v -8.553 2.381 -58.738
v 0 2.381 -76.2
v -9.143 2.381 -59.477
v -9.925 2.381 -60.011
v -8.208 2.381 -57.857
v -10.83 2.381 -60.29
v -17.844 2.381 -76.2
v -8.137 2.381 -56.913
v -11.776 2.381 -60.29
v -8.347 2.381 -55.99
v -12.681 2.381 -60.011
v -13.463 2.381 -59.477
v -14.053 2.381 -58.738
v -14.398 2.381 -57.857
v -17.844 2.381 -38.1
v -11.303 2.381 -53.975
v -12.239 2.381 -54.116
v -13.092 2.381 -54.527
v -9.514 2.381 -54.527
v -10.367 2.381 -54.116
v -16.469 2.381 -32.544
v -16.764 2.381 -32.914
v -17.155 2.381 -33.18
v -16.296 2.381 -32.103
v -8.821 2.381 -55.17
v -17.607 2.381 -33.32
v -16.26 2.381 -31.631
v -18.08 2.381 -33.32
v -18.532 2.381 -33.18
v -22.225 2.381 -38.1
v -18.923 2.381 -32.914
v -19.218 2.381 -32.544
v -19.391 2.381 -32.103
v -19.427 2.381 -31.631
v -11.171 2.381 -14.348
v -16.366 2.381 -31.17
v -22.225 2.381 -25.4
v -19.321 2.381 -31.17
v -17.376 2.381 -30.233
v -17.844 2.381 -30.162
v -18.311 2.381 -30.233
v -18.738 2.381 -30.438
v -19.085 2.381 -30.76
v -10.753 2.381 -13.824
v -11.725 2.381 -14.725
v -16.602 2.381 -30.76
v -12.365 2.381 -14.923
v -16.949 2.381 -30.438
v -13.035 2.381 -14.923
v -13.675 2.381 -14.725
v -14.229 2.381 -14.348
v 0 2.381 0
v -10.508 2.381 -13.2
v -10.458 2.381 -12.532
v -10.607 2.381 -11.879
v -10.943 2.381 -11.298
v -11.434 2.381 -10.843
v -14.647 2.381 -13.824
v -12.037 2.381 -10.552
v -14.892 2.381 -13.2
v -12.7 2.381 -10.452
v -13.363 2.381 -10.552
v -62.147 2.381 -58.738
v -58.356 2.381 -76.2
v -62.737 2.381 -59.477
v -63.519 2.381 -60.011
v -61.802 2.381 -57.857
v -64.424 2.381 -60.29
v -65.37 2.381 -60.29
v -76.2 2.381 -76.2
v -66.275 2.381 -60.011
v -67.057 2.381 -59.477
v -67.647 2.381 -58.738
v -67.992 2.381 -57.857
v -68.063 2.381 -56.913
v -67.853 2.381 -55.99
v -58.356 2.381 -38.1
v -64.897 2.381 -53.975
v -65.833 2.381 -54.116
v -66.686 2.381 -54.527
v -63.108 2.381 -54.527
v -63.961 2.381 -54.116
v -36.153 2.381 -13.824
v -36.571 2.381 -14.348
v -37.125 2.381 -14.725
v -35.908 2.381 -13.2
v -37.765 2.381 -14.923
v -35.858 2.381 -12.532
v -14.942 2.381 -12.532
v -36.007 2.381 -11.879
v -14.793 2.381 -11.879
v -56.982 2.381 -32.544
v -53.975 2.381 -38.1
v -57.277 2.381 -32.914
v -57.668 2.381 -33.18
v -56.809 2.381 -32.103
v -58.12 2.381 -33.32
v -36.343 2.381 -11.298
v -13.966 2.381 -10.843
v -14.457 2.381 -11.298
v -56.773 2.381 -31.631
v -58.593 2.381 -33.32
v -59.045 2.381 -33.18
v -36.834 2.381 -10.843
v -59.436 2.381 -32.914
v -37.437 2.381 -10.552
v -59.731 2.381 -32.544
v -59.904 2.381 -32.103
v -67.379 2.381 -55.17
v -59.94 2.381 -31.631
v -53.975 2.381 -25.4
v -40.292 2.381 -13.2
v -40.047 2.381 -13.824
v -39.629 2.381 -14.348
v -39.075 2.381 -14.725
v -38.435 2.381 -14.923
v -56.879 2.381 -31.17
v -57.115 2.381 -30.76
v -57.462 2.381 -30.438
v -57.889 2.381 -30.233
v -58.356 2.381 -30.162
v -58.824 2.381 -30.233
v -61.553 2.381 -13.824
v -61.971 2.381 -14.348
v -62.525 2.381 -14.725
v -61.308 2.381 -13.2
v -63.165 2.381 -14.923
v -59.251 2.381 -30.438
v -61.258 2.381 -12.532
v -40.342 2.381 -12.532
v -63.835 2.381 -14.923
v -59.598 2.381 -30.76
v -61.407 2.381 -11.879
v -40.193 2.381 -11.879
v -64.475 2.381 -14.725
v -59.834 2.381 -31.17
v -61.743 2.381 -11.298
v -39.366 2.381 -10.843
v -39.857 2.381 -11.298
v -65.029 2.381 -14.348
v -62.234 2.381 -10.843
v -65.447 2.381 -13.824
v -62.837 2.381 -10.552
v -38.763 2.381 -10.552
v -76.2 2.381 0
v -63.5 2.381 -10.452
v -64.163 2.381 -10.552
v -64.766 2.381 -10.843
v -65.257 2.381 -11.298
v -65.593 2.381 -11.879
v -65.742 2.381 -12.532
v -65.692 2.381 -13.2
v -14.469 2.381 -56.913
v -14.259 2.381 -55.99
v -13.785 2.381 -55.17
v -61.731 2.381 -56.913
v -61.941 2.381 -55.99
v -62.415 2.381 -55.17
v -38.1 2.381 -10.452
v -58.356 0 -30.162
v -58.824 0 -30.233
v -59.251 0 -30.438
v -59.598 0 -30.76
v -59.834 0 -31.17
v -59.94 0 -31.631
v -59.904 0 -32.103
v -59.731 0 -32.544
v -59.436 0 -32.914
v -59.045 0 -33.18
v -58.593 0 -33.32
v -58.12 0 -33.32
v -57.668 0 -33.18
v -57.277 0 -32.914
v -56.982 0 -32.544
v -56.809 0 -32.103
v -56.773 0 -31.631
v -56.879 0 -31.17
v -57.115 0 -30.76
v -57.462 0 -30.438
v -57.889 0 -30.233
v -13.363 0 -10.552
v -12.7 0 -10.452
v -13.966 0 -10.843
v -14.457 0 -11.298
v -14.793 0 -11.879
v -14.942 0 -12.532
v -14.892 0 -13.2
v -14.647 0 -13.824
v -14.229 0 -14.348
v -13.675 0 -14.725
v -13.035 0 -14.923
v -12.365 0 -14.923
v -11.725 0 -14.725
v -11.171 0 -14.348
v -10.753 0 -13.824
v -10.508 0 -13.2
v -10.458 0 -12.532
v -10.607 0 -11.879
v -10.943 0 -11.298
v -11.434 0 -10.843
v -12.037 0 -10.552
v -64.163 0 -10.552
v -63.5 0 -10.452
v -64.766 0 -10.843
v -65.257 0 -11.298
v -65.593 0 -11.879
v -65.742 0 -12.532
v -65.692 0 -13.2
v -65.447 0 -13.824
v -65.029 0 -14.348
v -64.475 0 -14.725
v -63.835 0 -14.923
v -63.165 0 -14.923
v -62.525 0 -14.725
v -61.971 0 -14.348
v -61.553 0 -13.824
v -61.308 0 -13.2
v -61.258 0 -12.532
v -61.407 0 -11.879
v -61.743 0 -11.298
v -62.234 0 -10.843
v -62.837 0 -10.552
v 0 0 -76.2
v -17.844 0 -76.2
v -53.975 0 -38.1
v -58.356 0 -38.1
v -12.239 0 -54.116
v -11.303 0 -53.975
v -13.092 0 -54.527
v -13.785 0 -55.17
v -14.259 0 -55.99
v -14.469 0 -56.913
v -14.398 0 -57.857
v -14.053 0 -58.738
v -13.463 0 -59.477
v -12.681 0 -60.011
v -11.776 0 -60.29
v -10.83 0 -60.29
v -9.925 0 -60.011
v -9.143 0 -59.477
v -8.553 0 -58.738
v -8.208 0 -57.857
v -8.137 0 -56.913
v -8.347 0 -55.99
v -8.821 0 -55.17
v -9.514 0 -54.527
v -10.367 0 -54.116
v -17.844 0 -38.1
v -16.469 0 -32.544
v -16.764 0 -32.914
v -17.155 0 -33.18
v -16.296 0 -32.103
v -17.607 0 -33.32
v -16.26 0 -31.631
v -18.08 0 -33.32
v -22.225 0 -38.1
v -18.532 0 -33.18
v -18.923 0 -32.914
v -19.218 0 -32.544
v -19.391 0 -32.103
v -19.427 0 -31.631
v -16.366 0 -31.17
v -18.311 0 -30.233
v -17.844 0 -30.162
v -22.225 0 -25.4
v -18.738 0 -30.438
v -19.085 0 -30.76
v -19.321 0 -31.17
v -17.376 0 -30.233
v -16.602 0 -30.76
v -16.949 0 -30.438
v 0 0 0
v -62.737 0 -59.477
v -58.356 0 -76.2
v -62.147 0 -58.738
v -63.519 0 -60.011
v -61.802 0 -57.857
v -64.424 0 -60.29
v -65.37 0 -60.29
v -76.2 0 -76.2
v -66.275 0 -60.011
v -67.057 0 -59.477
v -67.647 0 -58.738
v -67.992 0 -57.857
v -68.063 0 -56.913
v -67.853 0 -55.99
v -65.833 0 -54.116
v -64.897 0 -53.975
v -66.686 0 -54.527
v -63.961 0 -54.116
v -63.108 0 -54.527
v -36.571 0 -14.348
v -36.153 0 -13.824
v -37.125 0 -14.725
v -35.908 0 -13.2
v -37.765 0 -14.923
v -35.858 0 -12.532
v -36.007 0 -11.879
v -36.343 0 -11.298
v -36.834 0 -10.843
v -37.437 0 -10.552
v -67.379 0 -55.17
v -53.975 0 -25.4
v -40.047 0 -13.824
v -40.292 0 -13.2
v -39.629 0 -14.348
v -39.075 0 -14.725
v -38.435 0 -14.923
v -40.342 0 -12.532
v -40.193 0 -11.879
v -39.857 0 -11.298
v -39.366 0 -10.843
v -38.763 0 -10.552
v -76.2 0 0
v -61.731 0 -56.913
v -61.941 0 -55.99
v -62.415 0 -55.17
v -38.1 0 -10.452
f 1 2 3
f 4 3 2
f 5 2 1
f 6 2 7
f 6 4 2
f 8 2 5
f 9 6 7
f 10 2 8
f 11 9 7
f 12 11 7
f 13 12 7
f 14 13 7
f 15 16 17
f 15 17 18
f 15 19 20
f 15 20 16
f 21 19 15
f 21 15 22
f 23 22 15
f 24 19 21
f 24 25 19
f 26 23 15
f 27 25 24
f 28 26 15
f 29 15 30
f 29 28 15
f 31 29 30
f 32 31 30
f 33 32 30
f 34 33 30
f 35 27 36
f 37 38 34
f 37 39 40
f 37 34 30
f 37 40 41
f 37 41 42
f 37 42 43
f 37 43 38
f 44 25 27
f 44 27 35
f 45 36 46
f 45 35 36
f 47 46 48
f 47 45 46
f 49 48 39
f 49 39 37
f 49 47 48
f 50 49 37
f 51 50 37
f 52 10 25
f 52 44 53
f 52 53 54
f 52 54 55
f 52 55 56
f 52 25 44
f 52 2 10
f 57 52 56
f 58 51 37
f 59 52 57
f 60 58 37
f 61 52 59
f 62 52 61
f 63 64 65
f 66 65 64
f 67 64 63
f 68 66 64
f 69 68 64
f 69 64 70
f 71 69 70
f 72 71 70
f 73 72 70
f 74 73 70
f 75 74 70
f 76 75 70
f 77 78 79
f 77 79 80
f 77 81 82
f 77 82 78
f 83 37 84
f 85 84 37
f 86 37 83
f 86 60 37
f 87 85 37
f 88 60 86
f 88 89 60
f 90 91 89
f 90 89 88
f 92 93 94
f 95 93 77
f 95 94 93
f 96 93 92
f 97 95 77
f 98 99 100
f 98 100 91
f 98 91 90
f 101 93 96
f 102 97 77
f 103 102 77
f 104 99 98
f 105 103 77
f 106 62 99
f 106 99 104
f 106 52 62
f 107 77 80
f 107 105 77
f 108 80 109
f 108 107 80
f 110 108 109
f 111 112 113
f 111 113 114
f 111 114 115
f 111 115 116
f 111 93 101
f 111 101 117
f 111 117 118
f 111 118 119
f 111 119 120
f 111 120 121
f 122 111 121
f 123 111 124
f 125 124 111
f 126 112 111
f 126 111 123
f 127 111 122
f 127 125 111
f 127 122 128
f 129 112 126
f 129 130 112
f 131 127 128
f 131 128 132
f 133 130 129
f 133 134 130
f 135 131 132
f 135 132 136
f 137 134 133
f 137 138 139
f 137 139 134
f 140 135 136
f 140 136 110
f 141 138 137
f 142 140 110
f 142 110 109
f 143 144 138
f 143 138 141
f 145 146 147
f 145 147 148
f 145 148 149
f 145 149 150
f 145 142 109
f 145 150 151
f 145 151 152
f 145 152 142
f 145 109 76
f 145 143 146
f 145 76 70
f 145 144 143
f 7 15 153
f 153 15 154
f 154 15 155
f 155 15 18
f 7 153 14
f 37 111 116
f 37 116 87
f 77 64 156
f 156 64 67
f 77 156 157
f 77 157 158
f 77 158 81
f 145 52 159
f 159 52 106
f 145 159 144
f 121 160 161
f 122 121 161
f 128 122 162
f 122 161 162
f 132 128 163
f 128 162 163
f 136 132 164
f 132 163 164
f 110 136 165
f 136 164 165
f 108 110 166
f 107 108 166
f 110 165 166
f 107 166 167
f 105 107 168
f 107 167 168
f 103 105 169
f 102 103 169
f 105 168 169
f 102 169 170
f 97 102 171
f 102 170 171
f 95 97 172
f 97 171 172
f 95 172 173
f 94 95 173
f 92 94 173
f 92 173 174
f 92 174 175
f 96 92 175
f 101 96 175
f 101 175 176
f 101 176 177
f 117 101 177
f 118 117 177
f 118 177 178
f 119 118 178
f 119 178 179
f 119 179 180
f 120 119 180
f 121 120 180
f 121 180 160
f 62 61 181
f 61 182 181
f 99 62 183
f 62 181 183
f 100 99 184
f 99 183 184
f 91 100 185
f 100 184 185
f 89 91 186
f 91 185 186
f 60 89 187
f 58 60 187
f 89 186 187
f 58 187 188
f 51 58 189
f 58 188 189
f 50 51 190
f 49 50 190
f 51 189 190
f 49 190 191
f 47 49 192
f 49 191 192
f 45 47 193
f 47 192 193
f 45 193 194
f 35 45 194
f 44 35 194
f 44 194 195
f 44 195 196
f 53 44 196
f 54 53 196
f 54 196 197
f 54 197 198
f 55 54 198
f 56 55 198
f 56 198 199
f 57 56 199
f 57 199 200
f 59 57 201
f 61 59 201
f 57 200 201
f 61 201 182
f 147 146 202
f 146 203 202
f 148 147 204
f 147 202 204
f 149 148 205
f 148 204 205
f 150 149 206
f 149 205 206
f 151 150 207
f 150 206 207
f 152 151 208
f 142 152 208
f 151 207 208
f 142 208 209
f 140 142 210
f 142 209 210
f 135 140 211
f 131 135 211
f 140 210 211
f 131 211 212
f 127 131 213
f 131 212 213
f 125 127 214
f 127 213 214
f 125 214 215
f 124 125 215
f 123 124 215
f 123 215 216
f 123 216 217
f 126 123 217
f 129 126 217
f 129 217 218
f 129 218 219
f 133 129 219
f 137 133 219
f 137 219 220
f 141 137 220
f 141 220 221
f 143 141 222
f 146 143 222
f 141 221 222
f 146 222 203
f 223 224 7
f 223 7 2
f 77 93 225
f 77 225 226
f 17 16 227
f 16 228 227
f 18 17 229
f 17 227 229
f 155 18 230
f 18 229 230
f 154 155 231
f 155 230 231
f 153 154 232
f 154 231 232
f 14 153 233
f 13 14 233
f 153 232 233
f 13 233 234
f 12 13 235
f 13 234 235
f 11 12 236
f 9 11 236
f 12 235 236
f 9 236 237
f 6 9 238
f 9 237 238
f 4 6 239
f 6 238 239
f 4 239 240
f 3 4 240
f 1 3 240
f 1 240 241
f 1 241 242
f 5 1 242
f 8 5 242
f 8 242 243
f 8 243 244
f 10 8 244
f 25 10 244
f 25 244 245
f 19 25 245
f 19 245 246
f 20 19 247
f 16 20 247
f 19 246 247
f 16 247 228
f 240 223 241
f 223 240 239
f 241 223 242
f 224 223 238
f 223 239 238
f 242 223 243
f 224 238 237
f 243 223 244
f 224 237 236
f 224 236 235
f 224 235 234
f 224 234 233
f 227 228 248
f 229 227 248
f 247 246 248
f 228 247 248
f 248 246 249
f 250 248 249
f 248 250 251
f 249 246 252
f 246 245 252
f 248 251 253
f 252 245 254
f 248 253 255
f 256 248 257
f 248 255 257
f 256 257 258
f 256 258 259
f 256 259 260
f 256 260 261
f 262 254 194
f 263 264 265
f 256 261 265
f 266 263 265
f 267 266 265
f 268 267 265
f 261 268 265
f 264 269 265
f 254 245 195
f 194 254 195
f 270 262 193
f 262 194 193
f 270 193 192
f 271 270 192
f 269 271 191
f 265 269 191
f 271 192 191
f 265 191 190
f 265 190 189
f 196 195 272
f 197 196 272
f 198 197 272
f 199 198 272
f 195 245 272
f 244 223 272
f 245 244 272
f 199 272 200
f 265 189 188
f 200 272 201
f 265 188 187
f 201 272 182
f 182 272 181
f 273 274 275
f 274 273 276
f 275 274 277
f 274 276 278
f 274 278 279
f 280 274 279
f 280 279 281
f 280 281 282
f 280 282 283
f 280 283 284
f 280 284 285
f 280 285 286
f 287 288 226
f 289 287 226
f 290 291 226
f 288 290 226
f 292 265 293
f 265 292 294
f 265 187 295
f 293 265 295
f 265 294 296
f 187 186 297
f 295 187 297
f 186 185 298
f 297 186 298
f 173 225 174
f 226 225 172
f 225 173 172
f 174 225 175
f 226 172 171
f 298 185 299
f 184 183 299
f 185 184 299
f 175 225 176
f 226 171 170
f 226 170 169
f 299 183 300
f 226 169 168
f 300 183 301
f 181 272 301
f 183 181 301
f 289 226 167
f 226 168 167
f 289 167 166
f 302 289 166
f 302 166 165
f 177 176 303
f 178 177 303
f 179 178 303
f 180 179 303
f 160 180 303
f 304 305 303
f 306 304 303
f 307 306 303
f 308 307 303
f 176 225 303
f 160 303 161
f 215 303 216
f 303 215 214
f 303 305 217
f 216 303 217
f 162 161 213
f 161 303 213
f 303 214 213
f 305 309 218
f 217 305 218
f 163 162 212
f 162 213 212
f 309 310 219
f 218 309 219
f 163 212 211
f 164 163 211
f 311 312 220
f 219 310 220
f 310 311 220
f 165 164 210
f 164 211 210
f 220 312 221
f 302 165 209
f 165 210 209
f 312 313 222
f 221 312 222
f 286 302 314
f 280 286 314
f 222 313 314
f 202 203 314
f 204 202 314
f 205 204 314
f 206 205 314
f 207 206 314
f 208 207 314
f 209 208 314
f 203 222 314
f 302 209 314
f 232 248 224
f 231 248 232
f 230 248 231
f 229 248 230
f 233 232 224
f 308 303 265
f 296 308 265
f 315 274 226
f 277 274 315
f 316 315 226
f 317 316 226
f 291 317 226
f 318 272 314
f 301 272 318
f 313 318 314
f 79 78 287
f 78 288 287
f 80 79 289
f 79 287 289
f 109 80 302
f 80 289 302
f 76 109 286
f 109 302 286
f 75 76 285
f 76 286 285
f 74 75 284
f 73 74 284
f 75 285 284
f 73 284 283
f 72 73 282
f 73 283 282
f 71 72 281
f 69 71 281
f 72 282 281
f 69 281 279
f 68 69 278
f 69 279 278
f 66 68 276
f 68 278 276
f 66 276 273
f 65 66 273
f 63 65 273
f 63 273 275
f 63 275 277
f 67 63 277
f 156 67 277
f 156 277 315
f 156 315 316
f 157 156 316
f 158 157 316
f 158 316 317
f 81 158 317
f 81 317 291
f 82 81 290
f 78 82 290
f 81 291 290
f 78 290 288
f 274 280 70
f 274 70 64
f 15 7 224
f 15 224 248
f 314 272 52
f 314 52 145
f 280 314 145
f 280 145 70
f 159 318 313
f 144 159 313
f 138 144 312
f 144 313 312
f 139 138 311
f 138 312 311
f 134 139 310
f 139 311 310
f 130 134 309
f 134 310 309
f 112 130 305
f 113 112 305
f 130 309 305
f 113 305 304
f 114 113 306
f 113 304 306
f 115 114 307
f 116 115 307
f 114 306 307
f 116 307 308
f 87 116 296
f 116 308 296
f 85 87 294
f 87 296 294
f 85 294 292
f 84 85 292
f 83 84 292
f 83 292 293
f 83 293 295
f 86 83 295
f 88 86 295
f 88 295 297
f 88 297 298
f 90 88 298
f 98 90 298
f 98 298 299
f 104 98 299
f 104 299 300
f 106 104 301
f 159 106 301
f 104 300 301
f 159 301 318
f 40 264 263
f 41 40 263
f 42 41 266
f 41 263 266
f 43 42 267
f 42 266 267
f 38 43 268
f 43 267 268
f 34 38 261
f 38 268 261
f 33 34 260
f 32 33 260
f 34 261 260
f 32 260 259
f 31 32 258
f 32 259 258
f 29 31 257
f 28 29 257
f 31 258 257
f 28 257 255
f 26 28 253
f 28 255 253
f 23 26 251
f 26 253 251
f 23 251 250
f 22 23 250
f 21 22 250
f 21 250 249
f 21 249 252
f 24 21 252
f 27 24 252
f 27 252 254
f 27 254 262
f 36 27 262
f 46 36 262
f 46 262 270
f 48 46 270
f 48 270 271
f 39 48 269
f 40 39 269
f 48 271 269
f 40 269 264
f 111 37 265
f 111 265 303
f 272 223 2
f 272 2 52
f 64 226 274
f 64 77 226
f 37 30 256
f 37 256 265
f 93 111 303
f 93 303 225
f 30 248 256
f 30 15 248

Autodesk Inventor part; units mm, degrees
ref_plane "YZ Plane" through (0, 0, 0) normal (1, 0, 0) x (0, 1, 0)
ref_plane "XZ Plane" through (0, 0, 0) normal (0, 1, 0) x (-1, 0, 0)
ref_plane "XY Plane" through (0, 0, 0) normal (0, 0, 1) x (1, 0, 0)
sketch "Sketch1" plane through (0, 0, 0) normal (0, 1, 0) x (-1, 0, 0)
  line L0 (0, 0) -> (76.2, 0)
  line L1 (76.2, 0) -> (76.2, -76.2)
  line L2 (76.2, -76.2) -> (0, -76.2)
  line L3 (0, -76.2) -> (0, 0)
  dimension "d0" = 76.2
  dimension "d1" = 76.2
extrude "Extrusion1" add sketch "Sketch1" along normal blind 2.3813
sketch "Sketch2" plane through (0, 2.3813, 0) normal (0, 1, 0) x (1, 0, 0)
  line L0 (-83.8553, 12.7) -> (21.3104, 12.7) construction
  line L1 (-76.2, 0) -> (0, 0) construction
  line L2 (-76.2, 76.2) -> (-76.2, 0) construction
  point P0 (-63.5, 12.7)
  point P1 (-38.1, 12.7)
  point P2 (-12.7, 12.7)
  dimension "d4" = 12.7
  dimension "d5" = 12.7
  dimension "d6" = 25.4
  dimension "d39" = 25.4
hole "Hole1" at (-63.5, 2.3813, -12.7) at (-38.1, 2.3813, -12.7) at (-12.7, 2.3813, -12.7) direction (0, -1, 0) diameter 4.4958 end through all clearance for "Flat Head Machine Screw (82)" size "#8" standard "Ansi Unified Screw Threads"
sketch "Sketch3" plane through (0, 2.3813, 0) normal (0, 1, 0) x (1, 0, 0)
  line L0 (-85.7811, 31.75) -> (14.4142, 31.75) construction
  line L1 (-76.2, 0) -> (0, 0) construction
  line L2 (-38.1, 80.8292) -> (-38.1, -11.6218) construction
  line L3 (0, 76.2) -> (-76.2, 76.2) construction
  point P0 (-58.3565, 31.75)
  point P1 (-17.8435, 31.75)
  point P2 (-38.1, 76.2)
  dimension "d14" = 31.75
  dimension "d16" = 40.513
hole "Hole2" at (-58.3565, 2.3813, -31.75) at (-17.8435, 2.3813, -31.75) direction (0, -1, 0) diameter 3.175 end through all
sketch "Sketch4" plane through (0, 2.3813, 0) normal (0, 1, 0) x (1, 0, 0)
  line L0 (-58.3565, 76.2) -> (-17.8435, 76.2)
  line L1 (-17.8435, 76.2) -> (-17.8435, 38.1)
  line L2 (-17.8435, 38.1) -> (-58.3565, 38.1)
  line L3 (-58.3565, 38.1) -> (-58.3565, 76.2)
  line L4 (0, 76.2) -> (-76.2, 76.2) projected
  line L5 (-38.1, 81.963) -> (-38.1, -24.4331)
  line L6 (-76.2, 0) -> (0, 0) projected
  line L7 (-53.975, 38.1) -> (-22.225, 38.1)
  line L8 (-22.225, 38.1) -> (-22.225, 25.4)
  line L9 (-22.225, 25.4) -> (-53.975, 25.4)
  line L10 (-53.975, 25.4) -> (-53.975, 38.1)
  point P0 (-38.1, 0)
  dimension "d24" = 38.1
  dimension "d27" = 31.75
  dimension "d28" = 12.7
  dimension "d29" = 40.513
extrude "Extrusion2" cut sketch "Sketch4" against normal blind 2.3813
sketch "Sketch5" plane through (0, 2.3813, 0) normal (0, 1, 0) x (1, 0, 0)
  line L0 (-81.1122, 57.15) -> (21.0892, 57.15) construction
  line L1 (-58.3565, 76.2) -> (-76.2, 76.2) construction
  line L2 (-38.1, 88.2697) -> (-38.1, -12.0157) construction
  line L3 (-76.2, 0) -> (0, 0) construction
  point P0 (-64.897, 57.15)
  point P1 (-11.303, 57.15)
  point P2 (-38.1, 0)
  dimension "d30" = 19.05
  dimension "d31" = 53.594
hole "Hole3" at (-64.897, 2.3813, -57.15) at (-11.303, 2.3813, -57.15) direction (0, -1, 0) diameter 6.35 end through all
equation "\"d39\" = d6"
properties part number "dmc_plate"
